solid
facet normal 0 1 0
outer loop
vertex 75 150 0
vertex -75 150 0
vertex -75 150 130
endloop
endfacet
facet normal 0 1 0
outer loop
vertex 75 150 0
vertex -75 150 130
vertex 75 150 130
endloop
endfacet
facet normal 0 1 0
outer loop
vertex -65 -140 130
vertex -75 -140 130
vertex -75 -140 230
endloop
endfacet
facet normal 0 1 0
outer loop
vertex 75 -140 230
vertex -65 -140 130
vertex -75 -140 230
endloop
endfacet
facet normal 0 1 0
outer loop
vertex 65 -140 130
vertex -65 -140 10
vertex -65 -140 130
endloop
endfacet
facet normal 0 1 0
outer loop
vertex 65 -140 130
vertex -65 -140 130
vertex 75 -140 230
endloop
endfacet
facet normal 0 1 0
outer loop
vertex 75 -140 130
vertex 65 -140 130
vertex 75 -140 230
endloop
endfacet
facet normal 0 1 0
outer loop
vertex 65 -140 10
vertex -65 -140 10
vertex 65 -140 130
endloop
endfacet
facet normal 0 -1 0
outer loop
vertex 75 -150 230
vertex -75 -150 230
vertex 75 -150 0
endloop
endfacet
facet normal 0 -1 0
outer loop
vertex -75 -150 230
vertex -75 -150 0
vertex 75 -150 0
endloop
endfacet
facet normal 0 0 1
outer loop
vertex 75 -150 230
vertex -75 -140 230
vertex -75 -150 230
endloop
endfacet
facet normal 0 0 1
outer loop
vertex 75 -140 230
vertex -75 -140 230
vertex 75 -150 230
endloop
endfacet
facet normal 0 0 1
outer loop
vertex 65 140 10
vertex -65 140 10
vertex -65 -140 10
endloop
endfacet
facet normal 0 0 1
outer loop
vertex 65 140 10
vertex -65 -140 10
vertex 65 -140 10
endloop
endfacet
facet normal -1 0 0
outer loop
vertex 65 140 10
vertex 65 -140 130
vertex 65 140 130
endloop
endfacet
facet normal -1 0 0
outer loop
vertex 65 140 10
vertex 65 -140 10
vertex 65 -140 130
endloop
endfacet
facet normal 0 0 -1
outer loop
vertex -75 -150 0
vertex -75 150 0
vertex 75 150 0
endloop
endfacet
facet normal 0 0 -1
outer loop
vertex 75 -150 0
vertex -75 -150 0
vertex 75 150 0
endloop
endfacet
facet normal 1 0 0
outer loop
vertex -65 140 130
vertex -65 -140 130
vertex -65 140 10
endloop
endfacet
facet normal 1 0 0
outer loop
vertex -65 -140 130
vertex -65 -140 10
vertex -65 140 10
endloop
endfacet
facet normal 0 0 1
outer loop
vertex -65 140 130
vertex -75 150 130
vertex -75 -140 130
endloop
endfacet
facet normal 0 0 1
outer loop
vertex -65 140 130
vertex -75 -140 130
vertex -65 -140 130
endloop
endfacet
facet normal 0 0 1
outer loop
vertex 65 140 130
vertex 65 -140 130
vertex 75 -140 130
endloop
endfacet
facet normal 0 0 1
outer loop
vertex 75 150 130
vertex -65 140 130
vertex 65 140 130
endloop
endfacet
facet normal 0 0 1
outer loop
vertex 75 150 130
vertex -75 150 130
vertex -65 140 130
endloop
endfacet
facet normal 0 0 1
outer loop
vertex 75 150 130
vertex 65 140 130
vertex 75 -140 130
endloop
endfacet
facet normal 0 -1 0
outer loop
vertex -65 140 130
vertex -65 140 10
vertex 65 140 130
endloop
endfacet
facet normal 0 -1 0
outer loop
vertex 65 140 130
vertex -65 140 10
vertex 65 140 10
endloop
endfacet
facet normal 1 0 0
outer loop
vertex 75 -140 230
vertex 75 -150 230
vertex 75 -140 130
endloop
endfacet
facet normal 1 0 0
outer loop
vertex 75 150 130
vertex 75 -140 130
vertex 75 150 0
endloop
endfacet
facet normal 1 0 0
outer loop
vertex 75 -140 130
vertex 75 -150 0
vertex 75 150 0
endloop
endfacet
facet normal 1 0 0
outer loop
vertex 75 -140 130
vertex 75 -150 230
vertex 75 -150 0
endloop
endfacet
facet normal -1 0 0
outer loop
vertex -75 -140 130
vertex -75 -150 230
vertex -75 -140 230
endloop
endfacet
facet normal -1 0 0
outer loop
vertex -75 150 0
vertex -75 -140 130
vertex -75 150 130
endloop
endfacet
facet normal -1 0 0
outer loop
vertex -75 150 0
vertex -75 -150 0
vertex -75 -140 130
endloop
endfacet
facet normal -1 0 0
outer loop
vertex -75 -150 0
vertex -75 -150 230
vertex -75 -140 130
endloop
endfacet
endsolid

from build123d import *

# Parameters (mm, degrees)
F0_W     = 150
F0_H     = 300
F1_DEPTH = 130
F2_T     = -10
F3_W     = 150
F3_H     = 10
F4_DEPTH = 100


with BuildPart() as f1:
    # F0 (on Top) → F1 (new body)
    with BuildSketch(Plane.XY):
        Rectangle(F0_W, F0_H)
    extrude(amount=F1_DEPTH)

    # F2
    f2_openings = [f1.faces().sort_by_distance(p)[0] for p in [
        (0, 0, 130),
    ]]
    offset(amount=F2_T, openings=f2_openings)

    # F3 (on face) → F4 (join)
    with BuildSketch(Plane.XY.offset(130)):
        with Locations((0, -145)):
            Rectangle(F3_W, F3_H)
    extrude(amount=F4_DEPTH)


solid = f1.part
